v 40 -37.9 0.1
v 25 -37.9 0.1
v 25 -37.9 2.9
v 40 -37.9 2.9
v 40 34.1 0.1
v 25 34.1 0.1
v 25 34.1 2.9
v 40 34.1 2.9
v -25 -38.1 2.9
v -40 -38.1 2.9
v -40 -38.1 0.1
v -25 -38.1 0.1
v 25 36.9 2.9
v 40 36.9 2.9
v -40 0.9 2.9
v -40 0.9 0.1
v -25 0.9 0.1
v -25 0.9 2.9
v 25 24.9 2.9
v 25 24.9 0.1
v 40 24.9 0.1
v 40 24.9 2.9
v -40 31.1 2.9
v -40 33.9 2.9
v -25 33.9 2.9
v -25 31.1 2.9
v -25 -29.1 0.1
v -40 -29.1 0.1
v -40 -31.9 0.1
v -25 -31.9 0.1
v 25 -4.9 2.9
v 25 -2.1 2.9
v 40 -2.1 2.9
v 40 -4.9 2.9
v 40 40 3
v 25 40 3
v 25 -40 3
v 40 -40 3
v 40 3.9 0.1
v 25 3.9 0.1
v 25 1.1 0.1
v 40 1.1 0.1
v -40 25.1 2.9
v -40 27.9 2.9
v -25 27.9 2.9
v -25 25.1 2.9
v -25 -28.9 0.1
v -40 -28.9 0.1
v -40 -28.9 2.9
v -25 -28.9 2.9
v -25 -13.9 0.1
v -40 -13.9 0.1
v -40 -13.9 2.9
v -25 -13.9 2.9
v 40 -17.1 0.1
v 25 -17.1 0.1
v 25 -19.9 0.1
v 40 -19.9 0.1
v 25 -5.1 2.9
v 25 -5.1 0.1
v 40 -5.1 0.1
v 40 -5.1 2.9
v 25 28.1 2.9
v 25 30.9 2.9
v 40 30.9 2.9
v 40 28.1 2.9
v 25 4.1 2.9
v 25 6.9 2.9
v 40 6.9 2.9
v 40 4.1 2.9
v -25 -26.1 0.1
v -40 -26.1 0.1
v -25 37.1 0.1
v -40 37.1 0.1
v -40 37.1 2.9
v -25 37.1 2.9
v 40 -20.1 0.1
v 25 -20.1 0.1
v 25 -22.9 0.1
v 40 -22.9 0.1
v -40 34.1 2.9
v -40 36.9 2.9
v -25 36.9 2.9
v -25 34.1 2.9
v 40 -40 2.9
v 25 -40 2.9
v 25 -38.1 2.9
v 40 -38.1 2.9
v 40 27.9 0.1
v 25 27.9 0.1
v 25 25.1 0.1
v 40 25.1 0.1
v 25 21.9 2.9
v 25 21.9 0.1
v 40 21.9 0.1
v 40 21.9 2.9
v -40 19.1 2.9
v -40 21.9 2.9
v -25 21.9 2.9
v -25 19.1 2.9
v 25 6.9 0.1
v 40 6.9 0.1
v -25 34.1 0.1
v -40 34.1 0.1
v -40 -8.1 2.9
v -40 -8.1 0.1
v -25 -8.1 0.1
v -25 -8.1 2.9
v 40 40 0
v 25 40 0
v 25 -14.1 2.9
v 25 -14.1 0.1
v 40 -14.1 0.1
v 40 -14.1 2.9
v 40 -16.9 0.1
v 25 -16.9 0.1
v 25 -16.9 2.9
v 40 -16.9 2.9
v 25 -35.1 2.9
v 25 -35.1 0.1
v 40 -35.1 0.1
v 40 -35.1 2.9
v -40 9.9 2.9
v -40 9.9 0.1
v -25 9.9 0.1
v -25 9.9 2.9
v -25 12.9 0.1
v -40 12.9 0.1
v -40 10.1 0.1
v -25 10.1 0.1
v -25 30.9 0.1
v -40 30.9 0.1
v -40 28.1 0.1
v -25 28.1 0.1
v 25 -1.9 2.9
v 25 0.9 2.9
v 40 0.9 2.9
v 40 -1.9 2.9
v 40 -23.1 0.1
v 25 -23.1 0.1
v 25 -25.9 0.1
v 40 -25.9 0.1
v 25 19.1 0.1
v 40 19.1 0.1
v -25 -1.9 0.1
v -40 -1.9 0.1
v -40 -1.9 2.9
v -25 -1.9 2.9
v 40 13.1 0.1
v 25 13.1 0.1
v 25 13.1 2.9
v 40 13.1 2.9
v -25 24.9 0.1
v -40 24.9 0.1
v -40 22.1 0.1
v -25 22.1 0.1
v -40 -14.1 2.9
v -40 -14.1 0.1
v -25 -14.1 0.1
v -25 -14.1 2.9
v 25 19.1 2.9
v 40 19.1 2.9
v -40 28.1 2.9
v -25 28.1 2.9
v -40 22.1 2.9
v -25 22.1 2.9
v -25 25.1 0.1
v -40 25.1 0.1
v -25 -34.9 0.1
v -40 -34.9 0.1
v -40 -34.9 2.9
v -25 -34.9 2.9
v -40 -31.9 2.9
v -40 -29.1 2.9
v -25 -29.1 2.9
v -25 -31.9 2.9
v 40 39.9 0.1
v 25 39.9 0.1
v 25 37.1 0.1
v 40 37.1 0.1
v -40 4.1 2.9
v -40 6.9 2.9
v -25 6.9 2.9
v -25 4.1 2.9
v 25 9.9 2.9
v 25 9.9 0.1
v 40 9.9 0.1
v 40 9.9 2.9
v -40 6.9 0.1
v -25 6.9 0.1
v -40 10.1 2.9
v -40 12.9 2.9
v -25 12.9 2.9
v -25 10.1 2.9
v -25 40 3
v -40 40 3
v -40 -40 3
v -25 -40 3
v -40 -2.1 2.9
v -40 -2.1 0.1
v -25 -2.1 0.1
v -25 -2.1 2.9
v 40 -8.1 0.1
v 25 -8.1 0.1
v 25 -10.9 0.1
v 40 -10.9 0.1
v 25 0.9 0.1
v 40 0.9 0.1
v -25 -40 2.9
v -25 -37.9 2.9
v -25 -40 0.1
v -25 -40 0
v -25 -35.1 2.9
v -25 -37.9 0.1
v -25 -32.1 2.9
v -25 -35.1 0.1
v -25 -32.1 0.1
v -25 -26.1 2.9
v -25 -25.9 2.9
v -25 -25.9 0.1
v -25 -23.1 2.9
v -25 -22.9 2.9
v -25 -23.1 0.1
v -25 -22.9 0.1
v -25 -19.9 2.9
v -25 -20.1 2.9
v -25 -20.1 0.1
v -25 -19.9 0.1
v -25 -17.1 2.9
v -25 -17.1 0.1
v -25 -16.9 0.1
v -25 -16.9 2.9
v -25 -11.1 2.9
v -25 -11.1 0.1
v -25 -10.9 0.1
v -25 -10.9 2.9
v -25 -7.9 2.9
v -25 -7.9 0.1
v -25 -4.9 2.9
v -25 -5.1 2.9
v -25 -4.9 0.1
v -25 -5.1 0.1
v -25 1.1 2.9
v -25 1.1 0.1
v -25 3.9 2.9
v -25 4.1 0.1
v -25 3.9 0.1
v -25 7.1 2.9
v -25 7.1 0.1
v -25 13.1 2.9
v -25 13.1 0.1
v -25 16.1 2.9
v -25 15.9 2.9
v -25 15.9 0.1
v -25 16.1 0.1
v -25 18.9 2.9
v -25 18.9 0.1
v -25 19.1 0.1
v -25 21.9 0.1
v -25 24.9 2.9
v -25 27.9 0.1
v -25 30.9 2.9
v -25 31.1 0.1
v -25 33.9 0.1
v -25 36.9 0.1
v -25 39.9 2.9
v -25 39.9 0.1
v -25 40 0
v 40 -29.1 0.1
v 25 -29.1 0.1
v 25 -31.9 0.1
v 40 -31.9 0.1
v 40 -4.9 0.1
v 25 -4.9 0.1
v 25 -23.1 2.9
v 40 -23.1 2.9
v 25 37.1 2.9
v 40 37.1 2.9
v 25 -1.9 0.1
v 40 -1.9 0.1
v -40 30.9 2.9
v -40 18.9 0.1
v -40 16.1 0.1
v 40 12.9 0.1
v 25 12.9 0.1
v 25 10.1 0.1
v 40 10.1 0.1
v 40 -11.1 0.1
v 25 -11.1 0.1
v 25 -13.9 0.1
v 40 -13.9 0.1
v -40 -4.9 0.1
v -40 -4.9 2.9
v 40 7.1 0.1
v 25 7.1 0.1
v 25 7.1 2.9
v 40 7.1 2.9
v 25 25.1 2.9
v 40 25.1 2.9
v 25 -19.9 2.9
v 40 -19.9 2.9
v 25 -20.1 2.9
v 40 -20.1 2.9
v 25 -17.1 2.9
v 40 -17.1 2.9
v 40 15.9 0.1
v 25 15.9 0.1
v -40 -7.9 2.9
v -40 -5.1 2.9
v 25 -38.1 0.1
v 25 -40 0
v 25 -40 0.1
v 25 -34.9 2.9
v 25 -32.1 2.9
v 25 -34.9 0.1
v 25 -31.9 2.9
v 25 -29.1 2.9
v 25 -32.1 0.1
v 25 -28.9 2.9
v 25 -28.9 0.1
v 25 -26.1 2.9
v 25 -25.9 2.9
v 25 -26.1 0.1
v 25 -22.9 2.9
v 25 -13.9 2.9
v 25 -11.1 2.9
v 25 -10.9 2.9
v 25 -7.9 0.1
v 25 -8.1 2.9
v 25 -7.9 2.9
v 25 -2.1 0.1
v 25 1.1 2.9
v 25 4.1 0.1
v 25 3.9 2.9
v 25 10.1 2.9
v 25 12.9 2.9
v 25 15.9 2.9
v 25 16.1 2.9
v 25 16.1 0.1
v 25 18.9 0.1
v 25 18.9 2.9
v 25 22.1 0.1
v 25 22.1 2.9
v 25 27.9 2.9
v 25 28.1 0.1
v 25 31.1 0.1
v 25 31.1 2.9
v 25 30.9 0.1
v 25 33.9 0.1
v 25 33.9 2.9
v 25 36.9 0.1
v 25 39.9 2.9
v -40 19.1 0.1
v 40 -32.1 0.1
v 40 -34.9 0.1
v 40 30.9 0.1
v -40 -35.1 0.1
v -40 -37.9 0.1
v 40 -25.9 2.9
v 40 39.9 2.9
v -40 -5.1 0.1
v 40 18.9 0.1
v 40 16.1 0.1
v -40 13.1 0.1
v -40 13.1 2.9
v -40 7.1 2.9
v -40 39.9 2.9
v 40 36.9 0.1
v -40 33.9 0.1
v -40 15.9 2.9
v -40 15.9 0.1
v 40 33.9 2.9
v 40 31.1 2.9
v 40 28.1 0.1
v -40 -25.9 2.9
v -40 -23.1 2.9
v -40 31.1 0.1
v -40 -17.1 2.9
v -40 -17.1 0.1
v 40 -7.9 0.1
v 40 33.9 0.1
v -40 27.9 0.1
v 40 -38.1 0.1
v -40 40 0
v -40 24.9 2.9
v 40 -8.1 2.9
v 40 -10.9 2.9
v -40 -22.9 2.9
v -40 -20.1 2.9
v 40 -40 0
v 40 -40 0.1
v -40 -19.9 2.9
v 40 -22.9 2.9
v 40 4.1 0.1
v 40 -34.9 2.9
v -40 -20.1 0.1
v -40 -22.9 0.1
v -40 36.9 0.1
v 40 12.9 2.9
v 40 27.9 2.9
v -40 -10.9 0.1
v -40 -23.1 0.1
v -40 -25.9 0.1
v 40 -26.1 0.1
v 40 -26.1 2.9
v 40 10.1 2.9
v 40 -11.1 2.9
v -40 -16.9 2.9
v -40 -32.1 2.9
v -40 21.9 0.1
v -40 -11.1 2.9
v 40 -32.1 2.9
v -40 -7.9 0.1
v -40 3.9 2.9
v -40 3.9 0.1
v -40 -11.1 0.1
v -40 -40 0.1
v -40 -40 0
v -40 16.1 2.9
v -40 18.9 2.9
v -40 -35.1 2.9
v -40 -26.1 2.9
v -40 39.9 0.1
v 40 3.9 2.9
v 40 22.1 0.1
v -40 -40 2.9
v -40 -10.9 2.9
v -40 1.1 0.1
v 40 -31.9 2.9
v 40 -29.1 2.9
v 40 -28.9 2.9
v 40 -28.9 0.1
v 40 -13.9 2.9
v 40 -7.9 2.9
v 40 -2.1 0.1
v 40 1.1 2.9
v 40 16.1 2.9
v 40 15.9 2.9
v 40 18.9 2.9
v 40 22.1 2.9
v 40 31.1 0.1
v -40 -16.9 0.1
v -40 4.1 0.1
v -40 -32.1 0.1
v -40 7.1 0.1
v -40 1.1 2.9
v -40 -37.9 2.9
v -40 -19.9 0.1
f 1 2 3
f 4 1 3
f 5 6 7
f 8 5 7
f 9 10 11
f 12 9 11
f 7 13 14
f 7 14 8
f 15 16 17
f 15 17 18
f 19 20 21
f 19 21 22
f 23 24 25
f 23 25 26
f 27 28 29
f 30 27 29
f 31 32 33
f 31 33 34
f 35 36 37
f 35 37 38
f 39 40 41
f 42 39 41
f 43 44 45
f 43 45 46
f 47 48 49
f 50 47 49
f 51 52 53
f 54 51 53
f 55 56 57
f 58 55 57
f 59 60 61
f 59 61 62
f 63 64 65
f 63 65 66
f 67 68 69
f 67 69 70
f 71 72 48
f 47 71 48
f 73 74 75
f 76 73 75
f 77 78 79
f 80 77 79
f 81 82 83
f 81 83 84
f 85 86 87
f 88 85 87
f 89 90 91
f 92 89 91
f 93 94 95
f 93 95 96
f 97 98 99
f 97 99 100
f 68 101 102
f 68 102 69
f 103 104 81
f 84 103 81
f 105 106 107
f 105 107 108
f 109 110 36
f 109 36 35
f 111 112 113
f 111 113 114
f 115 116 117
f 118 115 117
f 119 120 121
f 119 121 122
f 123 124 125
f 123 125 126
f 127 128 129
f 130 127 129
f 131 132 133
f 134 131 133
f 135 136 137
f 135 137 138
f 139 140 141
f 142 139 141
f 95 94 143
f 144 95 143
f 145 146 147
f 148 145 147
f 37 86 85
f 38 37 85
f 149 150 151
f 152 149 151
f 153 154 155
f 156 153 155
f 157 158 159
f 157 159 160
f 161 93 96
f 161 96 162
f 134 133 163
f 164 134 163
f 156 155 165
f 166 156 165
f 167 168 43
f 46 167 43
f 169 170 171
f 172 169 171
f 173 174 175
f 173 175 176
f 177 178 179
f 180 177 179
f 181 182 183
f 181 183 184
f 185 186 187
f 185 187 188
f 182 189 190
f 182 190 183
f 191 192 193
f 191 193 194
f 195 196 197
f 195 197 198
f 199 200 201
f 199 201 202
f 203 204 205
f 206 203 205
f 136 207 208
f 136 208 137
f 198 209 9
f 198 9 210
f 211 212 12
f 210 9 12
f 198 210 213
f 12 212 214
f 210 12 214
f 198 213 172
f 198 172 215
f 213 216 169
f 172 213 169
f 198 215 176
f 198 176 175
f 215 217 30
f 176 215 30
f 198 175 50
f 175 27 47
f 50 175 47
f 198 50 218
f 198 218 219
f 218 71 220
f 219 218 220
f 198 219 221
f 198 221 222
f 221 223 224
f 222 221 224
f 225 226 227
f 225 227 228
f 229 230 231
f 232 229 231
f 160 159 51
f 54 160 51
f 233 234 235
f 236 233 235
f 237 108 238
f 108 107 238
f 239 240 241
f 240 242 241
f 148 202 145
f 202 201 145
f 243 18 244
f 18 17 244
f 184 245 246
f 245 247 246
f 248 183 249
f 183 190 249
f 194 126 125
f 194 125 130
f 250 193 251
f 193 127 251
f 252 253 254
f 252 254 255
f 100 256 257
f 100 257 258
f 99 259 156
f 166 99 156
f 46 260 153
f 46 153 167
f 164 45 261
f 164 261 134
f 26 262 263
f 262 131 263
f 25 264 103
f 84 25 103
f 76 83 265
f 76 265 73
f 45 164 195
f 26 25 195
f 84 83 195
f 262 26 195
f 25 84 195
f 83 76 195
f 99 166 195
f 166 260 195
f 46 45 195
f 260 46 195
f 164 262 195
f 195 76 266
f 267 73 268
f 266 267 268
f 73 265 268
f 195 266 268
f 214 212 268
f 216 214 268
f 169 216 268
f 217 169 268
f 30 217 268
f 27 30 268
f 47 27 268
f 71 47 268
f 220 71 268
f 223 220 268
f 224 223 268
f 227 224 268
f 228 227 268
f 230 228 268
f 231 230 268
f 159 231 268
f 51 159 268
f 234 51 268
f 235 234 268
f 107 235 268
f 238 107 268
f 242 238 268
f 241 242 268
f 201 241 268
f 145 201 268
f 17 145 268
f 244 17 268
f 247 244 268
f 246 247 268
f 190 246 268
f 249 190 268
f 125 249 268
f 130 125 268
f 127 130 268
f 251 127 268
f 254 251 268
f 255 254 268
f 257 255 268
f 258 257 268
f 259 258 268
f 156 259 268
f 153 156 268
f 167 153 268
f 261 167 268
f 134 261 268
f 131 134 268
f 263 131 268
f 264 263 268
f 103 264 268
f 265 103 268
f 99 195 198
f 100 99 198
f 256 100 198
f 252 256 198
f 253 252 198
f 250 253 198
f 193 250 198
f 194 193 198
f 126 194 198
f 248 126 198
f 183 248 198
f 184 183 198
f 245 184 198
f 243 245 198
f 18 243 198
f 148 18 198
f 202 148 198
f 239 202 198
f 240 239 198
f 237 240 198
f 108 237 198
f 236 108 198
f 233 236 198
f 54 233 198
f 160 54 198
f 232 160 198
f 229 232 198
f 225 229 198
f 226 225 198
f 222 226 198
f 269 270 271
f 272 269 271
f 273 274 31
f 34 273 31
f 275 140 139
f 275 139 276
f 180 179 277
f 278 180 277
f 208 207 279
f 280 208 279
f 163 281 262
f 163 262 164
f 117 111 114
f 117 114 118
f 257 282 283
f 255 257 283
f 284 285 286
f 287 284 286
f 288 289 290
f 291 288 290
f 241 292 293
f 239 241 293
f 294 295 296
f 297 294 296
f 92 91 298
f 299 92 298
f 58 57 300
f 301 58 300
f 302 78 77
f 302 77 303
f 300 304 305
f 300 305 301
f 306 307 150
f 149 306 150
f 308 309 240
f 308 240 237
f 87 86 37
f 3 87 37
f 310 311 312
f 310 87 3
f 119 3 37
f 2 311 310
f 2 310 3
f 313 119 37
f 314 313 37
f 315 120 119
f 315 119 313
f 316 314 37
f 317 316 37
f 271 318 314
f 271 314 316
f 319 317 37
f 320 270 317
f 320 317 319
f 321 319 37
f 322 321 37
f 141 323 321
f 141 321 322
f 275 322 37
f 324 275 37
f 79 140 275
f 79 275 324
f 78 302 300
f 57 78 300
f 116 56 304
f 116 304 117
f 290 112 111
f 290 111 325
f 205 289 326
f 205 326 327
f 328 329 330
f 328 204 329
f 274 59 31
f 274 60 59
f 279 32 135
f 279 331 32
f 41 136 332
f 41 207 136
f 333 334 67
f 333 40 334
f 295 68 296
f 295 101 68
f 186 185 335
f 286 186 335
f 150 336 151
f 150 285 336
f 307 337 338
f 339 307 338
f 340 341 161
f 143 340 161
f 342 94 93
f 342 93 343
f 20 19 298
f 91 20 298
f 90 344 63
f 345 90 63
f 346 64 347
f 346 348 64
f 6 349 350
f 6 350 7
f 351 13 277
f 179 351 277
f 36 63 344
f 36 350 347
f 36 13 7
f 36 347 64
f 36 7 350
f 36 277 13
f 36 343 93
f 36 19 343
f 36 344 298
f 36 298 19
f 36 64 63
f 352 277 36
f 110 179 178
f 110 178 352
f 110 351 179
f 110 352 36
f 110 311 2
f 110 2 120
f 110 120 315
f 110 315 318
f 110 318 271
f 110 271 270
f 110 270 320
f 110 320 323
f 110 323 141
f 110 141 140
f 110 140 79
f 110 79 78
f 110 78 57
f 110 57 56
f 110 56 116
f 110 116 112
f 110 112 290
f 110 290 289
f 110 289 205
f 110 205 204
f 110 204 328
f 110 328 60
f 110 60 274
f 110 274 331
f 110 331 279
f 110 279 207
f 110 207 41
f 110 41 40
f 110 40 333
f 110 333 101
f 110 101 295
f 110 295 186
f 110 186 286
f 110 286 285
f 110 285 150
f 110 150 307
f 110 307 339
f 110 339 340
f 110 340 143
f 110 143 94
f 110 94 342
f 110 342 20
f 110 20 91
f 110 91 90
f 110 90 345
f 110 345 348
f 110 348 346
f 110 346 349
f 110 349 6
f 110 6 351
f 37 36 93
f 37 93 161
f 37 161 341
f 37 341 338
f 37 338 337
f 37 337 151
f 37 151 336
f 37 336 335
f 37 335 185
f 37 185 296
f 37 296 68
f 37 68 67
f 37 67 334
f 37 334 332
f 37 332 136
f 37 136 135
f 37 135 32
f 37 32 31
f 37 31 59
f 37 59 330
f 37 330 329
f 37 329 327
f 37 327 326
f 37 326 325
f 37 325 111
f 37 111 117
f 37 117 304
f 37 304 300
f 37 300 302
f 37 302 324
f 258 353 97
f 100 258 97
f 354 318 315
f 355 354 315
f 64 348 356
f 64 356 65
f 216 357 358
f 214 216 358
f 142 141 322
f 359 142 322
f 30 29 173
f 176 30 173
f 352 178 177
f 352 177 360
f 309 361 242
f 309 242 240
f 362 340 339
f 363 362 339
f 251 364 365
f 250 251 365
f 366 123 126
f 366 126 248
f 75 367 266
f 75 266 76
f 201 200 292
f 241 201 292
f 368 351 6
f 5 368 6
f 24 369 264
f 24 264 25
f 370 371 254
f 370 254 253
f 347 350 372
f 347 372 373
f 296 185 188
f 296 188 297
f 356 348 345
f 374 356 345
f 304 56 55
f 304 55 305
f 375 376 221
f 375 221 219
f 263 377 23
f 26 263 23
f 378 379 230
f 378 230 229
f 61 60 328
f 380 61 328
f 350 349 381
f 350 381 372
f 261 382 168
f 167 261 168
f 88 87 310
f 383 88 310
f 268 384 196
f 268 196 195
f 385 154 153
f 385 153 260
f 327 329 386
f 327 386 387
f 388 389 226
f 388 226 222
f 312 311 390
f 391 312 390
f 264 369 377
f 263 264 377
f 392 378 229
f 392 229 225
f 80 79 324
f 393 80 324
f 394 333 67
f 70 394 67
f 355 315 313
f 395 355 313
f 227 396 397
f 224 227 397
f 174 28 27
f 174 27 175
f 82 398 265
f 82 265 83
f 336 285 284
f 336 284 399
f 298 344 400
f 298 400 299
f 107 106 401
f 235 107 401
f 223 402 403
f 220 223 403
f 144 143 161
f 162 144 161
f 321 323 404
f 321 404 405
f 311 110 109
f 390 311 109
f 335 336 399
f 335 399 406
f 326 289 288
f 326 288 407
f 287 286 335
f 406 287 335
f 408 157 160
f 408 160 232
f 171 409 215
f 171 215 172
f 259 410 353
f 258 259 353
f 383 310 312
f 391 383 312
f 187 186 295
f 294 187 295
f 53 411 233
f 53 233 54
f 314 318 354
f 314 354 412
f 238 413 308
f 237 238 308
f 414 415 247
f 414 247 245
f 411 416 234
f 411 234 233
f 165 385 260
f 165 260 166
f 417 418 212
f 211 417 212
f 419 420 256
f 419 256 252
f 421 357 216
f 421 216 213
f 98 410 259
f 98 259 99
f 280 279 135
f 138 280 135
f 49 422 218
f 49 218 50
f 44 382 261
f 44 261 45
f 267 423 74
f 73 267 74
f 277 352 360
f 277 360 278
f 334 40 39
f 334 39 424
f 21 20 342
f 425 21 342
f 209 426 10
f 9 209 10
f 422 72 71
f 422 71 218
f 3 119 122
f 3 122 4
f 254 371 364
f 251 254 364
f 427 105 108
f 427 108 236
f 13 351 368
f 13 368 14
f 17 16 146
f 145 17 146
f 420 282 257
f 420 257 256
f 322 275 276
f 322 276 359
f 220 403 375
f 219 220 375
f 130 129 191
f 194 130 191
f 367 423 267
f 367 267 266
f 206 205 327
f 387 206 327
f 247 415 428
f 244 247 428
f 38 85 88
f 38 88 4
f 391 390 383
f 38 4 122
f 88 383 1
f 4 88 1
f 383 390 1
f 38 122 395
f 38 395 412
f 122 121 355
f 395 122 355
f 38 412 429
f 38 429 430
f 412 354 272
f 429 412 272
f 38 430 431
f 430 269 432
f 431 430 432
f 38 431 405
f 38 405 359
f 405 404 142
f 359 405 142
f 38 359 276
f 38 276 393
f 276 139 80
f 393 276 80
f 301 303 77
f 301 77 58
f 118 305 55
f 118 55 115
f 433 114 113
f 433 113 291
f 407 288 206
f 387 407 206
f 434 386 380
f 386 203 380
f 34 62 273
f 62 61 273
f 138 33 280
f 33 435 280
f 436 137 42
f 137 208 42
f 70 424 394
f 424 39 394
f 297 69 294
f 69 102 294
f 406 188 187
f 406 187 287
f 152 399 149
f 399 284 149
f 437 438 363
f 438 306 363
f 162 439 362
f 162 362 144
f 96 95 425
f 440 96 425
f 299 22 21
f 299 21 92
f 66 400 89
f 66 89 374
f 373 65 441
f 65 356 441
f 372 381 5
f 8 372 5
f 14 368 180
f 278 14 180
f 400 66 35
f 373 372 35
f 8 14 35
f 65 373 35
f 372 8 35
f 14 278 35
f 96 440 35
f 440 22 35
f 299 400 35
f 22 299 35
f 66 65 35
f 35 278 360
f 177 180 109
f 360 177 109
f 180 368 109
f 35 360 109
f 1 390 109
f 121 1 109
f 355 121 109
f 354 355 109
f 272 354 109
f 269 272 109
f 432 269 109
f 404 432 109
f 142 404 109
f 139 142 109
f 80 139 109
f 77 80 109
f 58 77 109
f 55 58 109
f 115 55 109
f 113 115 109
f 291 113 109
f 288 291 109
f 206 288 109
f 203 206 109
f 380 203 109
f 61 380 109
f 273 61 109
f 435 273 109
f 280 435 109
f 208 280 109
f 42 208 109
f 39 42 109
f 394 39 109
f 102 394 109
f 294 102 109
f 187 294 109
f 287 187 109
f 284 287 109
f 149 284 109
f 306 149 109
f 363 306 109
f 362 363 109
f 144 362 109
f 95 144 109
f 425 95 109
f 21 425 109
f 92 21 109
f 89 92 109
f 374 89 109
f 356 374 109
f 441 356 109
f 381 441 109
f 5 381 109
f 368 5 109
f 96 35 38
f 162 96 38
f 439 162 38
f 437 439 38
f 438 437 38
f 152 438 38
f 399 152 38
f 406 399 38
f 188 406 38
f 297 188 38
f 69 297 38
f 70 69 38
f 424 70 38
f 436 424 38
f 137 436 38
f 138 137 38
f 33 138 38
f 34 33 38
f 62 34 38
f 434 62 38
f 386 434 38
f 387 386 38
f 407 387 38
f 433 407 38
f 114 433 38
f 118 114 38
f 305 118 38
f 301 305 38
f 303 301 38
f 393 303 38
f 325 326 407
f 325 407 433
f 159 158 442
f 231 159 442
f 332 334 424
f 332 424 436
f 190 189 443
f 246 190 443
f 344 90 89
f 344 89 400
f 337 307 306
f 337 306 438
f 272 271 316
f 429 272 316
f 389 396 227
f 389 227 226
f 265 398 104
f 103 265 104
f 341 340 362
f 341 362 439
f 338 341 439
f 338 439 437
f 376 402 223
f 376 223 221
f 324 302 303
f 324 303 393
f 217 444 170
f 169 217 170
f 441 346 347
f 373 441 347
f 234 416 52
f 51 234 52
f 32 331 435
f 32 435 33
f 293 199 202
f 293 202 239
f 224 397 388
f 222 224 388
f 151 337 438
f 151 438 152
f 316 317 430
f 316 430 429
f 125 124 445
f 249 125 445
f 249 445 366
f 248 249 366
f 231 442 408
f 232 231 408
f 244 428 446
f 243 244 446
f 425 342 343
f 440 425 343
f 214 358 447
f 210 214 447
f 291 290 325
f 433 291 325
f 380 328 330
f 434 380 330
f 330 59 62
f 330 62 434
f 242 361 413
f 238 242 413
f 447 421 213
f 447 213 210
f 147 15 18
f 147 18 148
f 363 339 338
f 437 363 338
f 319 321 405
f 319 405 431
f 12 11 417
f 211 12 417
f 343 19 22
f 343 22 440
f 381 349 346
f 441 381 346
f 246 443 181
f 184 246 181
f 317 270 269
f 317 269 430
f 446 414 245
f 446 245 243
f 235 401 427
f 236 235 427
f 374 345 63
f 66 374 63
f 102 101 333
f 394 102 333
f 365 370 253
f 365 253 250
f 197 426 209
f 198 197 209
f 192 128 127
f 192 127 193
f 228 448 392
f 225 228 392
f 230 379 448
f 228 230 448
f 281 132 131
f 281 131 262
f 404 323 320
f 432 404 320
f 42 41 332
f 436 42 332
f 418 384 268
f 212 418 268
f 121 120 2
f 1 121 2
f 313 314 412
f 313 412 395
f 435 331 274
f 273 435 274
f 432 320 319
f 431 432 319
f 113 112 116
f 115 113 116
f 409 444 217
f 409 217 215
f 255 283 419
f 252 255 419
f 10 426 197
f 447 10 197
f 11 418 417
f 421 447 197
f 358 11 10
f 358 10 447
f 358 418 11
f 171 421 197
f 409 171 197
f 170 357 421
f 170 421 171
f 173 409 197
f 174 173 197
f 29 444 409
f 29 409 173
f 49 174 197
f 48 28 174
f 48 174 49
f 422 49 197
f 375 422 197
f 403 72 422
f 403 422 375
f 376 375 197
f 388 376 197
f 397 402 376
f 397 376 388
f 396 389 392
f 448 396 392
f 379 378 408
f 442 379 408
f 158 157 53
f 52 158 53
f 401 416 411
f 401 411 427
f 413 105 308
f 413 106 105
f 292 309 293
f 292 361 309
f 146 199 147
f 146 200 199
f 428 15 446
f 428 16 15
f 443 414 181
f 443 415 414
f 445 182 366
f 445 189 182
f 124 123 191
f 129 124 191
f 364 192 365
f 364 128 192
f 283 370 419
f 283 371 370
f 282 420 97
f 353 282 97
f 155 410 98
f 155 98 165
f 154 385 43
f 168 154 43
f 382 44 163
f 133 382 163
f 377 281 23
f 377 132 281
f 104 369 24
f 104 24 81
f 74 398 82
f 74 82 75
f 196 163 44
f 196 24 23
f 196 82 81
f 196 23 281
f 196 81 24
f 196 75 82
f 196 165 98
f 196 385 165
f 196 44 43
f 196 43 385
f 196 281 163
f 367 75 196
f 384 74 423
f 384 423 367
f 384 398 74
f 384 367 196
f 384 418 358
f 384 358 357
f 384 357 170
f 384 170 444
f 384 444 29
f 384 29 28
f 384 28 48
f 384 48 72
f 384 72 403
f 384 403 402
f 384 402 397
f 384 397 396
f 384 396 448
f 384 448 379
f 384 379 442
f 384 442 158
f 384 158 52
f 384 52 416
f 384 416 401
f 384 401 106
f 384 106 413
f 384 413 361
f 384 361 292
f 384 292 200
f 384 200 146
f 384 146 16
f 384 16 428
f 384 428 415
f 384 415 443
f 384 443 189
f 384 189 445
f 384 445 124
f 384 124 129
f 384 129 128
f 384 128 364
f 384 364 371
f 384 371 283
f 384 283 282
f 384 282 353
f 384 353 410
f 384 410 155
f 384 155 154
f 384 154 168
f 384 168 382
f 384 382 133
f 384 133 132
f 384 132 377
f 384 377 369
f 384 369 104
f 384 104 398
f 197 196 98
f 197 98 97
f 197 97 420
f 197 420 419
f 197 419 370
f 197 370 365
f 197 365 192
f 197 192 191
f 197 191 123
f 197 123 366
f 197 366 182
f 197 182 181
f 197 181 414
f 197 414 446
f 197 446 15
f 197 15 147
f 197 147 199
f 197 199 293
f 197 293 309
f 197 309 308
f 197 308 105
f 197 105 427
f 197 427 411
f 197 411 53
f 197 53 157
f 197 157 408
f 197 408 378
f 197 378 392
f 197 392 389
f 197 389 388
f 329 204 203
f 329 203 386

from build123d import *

# Parameters (mm, degrees)
F0_W     = 15
F0_H     = 80
F1_DEPTH = 3
F2_W     = 2.8
F2_H     = 2.8
F2_W_2   = 0.9
F3_DEPTH = 80


with BuildPart() as f1:
    # F0 (on Top) → F1 (new body)
    with BuildSketch(Plane.XY):
        with Locations((32.5, 0)):
            Rectangle(F0_W, F0_H)
        with Locations((-32.5, 0)):
            Rectangle(F0_W, F0_H)
    extrude(amount=F1_DEPTH)

    # F2 (on face) → F3 (cut)
    with BuildSketch(Plane(origin=(-40, 0, 0), x_dir=(0, -1, 0), z_dir=(-1, 0, 0))):
        with Locations((-35.5, 1.5)):
            Rectangle(F2_W, F2_H)
        with Locations((-32.5, 1.5)):
            Rectangle(F2_W, F2_H)
        with Locations((-29.5, 1.5)):
            Rectangle(F2_W, F2_H)
        with Locations((-26.5, 1.5)):
            Rectangle(F2_W, F2_H)
        with Locations((-23.5, 1.5)):
            Rectangle(F2_W, F2_H)
        with Locations((-20.5, 1.5)):
            Rectangle(F2_W, F2_H)
        with Locations((-17.5, 1.5)):
            Rectangle(F2_W, F2_H)
        with Locations((-14.5, 1.5)):
            Rectangle(F2_W, F2_H)
        with Locations((-11.5, 1.5)):
            Rectangle(F2_W, F2_H)
        with Locations((-8.5, 1.5)):
            Rectangle(F2_W, F2_H)
        with Locations((-5.5, 1.5)):
            Rectangle(F2_W, F2_H)
        with Locations((-2.5, 1.5)):
            Rectangle(F2_W, F2_H)
        with Locations((0.5, 1.5)):
            Rectangle(F2_W, F2_H)
        with Locations((3.5, 1.5)):
            Rectangle(F2_W, F2_H)
        with Locations((6.5, 1.5)):
            Rectangle(F2_W, F2_H)
        with Locations((12.5, 1.5)):
            Rectangle(F2_W, F2_H)
        with Locations((15.5, 1.5)):
            Rectangle(F2_W, F2_H)
        with Locations((18.5, 1.5)):
            Rectangle(F2_W, F2_H)
        with Locations((21.5, 1.5)):
            Rectangle(F2_W, F2_H)
        with Locations((24.5, 1.5)):
            Rectangle(F2_W, F2_H)
        with Locations((27.5, 1.5)):
            Rectangle(F2_W, F2_H)
        with Locations((30.5, 1.5)):
            Rectangle(F2_W, F2_H)
        with Locations((33.5, 1.5)):
            Rectangle(F2_W, F2_H)
        with Locations((36.5, 1.5)):
            Rectangle(F2_W, F2_H)
        with Locations((40.45, 1.5)):
            Rectangle(F2_W_2, F2_H)
        Polygon((39.9, 2.9), (38.1, 2.9), (38.1, 0.1), (39.9, 0.1), (40, 0.1), (40, 2.9), align=None)
        with Locations((-38.5, 1.5)):
            Rectangle(F2_W, F2_H)
        with Locations((9.5, 1.5)):
            Rectangle(F2_W, F2_H)
    extrude(amount=-F3_DEPTH, mode=Mode.SUBTRACT)


solid = f1.part
